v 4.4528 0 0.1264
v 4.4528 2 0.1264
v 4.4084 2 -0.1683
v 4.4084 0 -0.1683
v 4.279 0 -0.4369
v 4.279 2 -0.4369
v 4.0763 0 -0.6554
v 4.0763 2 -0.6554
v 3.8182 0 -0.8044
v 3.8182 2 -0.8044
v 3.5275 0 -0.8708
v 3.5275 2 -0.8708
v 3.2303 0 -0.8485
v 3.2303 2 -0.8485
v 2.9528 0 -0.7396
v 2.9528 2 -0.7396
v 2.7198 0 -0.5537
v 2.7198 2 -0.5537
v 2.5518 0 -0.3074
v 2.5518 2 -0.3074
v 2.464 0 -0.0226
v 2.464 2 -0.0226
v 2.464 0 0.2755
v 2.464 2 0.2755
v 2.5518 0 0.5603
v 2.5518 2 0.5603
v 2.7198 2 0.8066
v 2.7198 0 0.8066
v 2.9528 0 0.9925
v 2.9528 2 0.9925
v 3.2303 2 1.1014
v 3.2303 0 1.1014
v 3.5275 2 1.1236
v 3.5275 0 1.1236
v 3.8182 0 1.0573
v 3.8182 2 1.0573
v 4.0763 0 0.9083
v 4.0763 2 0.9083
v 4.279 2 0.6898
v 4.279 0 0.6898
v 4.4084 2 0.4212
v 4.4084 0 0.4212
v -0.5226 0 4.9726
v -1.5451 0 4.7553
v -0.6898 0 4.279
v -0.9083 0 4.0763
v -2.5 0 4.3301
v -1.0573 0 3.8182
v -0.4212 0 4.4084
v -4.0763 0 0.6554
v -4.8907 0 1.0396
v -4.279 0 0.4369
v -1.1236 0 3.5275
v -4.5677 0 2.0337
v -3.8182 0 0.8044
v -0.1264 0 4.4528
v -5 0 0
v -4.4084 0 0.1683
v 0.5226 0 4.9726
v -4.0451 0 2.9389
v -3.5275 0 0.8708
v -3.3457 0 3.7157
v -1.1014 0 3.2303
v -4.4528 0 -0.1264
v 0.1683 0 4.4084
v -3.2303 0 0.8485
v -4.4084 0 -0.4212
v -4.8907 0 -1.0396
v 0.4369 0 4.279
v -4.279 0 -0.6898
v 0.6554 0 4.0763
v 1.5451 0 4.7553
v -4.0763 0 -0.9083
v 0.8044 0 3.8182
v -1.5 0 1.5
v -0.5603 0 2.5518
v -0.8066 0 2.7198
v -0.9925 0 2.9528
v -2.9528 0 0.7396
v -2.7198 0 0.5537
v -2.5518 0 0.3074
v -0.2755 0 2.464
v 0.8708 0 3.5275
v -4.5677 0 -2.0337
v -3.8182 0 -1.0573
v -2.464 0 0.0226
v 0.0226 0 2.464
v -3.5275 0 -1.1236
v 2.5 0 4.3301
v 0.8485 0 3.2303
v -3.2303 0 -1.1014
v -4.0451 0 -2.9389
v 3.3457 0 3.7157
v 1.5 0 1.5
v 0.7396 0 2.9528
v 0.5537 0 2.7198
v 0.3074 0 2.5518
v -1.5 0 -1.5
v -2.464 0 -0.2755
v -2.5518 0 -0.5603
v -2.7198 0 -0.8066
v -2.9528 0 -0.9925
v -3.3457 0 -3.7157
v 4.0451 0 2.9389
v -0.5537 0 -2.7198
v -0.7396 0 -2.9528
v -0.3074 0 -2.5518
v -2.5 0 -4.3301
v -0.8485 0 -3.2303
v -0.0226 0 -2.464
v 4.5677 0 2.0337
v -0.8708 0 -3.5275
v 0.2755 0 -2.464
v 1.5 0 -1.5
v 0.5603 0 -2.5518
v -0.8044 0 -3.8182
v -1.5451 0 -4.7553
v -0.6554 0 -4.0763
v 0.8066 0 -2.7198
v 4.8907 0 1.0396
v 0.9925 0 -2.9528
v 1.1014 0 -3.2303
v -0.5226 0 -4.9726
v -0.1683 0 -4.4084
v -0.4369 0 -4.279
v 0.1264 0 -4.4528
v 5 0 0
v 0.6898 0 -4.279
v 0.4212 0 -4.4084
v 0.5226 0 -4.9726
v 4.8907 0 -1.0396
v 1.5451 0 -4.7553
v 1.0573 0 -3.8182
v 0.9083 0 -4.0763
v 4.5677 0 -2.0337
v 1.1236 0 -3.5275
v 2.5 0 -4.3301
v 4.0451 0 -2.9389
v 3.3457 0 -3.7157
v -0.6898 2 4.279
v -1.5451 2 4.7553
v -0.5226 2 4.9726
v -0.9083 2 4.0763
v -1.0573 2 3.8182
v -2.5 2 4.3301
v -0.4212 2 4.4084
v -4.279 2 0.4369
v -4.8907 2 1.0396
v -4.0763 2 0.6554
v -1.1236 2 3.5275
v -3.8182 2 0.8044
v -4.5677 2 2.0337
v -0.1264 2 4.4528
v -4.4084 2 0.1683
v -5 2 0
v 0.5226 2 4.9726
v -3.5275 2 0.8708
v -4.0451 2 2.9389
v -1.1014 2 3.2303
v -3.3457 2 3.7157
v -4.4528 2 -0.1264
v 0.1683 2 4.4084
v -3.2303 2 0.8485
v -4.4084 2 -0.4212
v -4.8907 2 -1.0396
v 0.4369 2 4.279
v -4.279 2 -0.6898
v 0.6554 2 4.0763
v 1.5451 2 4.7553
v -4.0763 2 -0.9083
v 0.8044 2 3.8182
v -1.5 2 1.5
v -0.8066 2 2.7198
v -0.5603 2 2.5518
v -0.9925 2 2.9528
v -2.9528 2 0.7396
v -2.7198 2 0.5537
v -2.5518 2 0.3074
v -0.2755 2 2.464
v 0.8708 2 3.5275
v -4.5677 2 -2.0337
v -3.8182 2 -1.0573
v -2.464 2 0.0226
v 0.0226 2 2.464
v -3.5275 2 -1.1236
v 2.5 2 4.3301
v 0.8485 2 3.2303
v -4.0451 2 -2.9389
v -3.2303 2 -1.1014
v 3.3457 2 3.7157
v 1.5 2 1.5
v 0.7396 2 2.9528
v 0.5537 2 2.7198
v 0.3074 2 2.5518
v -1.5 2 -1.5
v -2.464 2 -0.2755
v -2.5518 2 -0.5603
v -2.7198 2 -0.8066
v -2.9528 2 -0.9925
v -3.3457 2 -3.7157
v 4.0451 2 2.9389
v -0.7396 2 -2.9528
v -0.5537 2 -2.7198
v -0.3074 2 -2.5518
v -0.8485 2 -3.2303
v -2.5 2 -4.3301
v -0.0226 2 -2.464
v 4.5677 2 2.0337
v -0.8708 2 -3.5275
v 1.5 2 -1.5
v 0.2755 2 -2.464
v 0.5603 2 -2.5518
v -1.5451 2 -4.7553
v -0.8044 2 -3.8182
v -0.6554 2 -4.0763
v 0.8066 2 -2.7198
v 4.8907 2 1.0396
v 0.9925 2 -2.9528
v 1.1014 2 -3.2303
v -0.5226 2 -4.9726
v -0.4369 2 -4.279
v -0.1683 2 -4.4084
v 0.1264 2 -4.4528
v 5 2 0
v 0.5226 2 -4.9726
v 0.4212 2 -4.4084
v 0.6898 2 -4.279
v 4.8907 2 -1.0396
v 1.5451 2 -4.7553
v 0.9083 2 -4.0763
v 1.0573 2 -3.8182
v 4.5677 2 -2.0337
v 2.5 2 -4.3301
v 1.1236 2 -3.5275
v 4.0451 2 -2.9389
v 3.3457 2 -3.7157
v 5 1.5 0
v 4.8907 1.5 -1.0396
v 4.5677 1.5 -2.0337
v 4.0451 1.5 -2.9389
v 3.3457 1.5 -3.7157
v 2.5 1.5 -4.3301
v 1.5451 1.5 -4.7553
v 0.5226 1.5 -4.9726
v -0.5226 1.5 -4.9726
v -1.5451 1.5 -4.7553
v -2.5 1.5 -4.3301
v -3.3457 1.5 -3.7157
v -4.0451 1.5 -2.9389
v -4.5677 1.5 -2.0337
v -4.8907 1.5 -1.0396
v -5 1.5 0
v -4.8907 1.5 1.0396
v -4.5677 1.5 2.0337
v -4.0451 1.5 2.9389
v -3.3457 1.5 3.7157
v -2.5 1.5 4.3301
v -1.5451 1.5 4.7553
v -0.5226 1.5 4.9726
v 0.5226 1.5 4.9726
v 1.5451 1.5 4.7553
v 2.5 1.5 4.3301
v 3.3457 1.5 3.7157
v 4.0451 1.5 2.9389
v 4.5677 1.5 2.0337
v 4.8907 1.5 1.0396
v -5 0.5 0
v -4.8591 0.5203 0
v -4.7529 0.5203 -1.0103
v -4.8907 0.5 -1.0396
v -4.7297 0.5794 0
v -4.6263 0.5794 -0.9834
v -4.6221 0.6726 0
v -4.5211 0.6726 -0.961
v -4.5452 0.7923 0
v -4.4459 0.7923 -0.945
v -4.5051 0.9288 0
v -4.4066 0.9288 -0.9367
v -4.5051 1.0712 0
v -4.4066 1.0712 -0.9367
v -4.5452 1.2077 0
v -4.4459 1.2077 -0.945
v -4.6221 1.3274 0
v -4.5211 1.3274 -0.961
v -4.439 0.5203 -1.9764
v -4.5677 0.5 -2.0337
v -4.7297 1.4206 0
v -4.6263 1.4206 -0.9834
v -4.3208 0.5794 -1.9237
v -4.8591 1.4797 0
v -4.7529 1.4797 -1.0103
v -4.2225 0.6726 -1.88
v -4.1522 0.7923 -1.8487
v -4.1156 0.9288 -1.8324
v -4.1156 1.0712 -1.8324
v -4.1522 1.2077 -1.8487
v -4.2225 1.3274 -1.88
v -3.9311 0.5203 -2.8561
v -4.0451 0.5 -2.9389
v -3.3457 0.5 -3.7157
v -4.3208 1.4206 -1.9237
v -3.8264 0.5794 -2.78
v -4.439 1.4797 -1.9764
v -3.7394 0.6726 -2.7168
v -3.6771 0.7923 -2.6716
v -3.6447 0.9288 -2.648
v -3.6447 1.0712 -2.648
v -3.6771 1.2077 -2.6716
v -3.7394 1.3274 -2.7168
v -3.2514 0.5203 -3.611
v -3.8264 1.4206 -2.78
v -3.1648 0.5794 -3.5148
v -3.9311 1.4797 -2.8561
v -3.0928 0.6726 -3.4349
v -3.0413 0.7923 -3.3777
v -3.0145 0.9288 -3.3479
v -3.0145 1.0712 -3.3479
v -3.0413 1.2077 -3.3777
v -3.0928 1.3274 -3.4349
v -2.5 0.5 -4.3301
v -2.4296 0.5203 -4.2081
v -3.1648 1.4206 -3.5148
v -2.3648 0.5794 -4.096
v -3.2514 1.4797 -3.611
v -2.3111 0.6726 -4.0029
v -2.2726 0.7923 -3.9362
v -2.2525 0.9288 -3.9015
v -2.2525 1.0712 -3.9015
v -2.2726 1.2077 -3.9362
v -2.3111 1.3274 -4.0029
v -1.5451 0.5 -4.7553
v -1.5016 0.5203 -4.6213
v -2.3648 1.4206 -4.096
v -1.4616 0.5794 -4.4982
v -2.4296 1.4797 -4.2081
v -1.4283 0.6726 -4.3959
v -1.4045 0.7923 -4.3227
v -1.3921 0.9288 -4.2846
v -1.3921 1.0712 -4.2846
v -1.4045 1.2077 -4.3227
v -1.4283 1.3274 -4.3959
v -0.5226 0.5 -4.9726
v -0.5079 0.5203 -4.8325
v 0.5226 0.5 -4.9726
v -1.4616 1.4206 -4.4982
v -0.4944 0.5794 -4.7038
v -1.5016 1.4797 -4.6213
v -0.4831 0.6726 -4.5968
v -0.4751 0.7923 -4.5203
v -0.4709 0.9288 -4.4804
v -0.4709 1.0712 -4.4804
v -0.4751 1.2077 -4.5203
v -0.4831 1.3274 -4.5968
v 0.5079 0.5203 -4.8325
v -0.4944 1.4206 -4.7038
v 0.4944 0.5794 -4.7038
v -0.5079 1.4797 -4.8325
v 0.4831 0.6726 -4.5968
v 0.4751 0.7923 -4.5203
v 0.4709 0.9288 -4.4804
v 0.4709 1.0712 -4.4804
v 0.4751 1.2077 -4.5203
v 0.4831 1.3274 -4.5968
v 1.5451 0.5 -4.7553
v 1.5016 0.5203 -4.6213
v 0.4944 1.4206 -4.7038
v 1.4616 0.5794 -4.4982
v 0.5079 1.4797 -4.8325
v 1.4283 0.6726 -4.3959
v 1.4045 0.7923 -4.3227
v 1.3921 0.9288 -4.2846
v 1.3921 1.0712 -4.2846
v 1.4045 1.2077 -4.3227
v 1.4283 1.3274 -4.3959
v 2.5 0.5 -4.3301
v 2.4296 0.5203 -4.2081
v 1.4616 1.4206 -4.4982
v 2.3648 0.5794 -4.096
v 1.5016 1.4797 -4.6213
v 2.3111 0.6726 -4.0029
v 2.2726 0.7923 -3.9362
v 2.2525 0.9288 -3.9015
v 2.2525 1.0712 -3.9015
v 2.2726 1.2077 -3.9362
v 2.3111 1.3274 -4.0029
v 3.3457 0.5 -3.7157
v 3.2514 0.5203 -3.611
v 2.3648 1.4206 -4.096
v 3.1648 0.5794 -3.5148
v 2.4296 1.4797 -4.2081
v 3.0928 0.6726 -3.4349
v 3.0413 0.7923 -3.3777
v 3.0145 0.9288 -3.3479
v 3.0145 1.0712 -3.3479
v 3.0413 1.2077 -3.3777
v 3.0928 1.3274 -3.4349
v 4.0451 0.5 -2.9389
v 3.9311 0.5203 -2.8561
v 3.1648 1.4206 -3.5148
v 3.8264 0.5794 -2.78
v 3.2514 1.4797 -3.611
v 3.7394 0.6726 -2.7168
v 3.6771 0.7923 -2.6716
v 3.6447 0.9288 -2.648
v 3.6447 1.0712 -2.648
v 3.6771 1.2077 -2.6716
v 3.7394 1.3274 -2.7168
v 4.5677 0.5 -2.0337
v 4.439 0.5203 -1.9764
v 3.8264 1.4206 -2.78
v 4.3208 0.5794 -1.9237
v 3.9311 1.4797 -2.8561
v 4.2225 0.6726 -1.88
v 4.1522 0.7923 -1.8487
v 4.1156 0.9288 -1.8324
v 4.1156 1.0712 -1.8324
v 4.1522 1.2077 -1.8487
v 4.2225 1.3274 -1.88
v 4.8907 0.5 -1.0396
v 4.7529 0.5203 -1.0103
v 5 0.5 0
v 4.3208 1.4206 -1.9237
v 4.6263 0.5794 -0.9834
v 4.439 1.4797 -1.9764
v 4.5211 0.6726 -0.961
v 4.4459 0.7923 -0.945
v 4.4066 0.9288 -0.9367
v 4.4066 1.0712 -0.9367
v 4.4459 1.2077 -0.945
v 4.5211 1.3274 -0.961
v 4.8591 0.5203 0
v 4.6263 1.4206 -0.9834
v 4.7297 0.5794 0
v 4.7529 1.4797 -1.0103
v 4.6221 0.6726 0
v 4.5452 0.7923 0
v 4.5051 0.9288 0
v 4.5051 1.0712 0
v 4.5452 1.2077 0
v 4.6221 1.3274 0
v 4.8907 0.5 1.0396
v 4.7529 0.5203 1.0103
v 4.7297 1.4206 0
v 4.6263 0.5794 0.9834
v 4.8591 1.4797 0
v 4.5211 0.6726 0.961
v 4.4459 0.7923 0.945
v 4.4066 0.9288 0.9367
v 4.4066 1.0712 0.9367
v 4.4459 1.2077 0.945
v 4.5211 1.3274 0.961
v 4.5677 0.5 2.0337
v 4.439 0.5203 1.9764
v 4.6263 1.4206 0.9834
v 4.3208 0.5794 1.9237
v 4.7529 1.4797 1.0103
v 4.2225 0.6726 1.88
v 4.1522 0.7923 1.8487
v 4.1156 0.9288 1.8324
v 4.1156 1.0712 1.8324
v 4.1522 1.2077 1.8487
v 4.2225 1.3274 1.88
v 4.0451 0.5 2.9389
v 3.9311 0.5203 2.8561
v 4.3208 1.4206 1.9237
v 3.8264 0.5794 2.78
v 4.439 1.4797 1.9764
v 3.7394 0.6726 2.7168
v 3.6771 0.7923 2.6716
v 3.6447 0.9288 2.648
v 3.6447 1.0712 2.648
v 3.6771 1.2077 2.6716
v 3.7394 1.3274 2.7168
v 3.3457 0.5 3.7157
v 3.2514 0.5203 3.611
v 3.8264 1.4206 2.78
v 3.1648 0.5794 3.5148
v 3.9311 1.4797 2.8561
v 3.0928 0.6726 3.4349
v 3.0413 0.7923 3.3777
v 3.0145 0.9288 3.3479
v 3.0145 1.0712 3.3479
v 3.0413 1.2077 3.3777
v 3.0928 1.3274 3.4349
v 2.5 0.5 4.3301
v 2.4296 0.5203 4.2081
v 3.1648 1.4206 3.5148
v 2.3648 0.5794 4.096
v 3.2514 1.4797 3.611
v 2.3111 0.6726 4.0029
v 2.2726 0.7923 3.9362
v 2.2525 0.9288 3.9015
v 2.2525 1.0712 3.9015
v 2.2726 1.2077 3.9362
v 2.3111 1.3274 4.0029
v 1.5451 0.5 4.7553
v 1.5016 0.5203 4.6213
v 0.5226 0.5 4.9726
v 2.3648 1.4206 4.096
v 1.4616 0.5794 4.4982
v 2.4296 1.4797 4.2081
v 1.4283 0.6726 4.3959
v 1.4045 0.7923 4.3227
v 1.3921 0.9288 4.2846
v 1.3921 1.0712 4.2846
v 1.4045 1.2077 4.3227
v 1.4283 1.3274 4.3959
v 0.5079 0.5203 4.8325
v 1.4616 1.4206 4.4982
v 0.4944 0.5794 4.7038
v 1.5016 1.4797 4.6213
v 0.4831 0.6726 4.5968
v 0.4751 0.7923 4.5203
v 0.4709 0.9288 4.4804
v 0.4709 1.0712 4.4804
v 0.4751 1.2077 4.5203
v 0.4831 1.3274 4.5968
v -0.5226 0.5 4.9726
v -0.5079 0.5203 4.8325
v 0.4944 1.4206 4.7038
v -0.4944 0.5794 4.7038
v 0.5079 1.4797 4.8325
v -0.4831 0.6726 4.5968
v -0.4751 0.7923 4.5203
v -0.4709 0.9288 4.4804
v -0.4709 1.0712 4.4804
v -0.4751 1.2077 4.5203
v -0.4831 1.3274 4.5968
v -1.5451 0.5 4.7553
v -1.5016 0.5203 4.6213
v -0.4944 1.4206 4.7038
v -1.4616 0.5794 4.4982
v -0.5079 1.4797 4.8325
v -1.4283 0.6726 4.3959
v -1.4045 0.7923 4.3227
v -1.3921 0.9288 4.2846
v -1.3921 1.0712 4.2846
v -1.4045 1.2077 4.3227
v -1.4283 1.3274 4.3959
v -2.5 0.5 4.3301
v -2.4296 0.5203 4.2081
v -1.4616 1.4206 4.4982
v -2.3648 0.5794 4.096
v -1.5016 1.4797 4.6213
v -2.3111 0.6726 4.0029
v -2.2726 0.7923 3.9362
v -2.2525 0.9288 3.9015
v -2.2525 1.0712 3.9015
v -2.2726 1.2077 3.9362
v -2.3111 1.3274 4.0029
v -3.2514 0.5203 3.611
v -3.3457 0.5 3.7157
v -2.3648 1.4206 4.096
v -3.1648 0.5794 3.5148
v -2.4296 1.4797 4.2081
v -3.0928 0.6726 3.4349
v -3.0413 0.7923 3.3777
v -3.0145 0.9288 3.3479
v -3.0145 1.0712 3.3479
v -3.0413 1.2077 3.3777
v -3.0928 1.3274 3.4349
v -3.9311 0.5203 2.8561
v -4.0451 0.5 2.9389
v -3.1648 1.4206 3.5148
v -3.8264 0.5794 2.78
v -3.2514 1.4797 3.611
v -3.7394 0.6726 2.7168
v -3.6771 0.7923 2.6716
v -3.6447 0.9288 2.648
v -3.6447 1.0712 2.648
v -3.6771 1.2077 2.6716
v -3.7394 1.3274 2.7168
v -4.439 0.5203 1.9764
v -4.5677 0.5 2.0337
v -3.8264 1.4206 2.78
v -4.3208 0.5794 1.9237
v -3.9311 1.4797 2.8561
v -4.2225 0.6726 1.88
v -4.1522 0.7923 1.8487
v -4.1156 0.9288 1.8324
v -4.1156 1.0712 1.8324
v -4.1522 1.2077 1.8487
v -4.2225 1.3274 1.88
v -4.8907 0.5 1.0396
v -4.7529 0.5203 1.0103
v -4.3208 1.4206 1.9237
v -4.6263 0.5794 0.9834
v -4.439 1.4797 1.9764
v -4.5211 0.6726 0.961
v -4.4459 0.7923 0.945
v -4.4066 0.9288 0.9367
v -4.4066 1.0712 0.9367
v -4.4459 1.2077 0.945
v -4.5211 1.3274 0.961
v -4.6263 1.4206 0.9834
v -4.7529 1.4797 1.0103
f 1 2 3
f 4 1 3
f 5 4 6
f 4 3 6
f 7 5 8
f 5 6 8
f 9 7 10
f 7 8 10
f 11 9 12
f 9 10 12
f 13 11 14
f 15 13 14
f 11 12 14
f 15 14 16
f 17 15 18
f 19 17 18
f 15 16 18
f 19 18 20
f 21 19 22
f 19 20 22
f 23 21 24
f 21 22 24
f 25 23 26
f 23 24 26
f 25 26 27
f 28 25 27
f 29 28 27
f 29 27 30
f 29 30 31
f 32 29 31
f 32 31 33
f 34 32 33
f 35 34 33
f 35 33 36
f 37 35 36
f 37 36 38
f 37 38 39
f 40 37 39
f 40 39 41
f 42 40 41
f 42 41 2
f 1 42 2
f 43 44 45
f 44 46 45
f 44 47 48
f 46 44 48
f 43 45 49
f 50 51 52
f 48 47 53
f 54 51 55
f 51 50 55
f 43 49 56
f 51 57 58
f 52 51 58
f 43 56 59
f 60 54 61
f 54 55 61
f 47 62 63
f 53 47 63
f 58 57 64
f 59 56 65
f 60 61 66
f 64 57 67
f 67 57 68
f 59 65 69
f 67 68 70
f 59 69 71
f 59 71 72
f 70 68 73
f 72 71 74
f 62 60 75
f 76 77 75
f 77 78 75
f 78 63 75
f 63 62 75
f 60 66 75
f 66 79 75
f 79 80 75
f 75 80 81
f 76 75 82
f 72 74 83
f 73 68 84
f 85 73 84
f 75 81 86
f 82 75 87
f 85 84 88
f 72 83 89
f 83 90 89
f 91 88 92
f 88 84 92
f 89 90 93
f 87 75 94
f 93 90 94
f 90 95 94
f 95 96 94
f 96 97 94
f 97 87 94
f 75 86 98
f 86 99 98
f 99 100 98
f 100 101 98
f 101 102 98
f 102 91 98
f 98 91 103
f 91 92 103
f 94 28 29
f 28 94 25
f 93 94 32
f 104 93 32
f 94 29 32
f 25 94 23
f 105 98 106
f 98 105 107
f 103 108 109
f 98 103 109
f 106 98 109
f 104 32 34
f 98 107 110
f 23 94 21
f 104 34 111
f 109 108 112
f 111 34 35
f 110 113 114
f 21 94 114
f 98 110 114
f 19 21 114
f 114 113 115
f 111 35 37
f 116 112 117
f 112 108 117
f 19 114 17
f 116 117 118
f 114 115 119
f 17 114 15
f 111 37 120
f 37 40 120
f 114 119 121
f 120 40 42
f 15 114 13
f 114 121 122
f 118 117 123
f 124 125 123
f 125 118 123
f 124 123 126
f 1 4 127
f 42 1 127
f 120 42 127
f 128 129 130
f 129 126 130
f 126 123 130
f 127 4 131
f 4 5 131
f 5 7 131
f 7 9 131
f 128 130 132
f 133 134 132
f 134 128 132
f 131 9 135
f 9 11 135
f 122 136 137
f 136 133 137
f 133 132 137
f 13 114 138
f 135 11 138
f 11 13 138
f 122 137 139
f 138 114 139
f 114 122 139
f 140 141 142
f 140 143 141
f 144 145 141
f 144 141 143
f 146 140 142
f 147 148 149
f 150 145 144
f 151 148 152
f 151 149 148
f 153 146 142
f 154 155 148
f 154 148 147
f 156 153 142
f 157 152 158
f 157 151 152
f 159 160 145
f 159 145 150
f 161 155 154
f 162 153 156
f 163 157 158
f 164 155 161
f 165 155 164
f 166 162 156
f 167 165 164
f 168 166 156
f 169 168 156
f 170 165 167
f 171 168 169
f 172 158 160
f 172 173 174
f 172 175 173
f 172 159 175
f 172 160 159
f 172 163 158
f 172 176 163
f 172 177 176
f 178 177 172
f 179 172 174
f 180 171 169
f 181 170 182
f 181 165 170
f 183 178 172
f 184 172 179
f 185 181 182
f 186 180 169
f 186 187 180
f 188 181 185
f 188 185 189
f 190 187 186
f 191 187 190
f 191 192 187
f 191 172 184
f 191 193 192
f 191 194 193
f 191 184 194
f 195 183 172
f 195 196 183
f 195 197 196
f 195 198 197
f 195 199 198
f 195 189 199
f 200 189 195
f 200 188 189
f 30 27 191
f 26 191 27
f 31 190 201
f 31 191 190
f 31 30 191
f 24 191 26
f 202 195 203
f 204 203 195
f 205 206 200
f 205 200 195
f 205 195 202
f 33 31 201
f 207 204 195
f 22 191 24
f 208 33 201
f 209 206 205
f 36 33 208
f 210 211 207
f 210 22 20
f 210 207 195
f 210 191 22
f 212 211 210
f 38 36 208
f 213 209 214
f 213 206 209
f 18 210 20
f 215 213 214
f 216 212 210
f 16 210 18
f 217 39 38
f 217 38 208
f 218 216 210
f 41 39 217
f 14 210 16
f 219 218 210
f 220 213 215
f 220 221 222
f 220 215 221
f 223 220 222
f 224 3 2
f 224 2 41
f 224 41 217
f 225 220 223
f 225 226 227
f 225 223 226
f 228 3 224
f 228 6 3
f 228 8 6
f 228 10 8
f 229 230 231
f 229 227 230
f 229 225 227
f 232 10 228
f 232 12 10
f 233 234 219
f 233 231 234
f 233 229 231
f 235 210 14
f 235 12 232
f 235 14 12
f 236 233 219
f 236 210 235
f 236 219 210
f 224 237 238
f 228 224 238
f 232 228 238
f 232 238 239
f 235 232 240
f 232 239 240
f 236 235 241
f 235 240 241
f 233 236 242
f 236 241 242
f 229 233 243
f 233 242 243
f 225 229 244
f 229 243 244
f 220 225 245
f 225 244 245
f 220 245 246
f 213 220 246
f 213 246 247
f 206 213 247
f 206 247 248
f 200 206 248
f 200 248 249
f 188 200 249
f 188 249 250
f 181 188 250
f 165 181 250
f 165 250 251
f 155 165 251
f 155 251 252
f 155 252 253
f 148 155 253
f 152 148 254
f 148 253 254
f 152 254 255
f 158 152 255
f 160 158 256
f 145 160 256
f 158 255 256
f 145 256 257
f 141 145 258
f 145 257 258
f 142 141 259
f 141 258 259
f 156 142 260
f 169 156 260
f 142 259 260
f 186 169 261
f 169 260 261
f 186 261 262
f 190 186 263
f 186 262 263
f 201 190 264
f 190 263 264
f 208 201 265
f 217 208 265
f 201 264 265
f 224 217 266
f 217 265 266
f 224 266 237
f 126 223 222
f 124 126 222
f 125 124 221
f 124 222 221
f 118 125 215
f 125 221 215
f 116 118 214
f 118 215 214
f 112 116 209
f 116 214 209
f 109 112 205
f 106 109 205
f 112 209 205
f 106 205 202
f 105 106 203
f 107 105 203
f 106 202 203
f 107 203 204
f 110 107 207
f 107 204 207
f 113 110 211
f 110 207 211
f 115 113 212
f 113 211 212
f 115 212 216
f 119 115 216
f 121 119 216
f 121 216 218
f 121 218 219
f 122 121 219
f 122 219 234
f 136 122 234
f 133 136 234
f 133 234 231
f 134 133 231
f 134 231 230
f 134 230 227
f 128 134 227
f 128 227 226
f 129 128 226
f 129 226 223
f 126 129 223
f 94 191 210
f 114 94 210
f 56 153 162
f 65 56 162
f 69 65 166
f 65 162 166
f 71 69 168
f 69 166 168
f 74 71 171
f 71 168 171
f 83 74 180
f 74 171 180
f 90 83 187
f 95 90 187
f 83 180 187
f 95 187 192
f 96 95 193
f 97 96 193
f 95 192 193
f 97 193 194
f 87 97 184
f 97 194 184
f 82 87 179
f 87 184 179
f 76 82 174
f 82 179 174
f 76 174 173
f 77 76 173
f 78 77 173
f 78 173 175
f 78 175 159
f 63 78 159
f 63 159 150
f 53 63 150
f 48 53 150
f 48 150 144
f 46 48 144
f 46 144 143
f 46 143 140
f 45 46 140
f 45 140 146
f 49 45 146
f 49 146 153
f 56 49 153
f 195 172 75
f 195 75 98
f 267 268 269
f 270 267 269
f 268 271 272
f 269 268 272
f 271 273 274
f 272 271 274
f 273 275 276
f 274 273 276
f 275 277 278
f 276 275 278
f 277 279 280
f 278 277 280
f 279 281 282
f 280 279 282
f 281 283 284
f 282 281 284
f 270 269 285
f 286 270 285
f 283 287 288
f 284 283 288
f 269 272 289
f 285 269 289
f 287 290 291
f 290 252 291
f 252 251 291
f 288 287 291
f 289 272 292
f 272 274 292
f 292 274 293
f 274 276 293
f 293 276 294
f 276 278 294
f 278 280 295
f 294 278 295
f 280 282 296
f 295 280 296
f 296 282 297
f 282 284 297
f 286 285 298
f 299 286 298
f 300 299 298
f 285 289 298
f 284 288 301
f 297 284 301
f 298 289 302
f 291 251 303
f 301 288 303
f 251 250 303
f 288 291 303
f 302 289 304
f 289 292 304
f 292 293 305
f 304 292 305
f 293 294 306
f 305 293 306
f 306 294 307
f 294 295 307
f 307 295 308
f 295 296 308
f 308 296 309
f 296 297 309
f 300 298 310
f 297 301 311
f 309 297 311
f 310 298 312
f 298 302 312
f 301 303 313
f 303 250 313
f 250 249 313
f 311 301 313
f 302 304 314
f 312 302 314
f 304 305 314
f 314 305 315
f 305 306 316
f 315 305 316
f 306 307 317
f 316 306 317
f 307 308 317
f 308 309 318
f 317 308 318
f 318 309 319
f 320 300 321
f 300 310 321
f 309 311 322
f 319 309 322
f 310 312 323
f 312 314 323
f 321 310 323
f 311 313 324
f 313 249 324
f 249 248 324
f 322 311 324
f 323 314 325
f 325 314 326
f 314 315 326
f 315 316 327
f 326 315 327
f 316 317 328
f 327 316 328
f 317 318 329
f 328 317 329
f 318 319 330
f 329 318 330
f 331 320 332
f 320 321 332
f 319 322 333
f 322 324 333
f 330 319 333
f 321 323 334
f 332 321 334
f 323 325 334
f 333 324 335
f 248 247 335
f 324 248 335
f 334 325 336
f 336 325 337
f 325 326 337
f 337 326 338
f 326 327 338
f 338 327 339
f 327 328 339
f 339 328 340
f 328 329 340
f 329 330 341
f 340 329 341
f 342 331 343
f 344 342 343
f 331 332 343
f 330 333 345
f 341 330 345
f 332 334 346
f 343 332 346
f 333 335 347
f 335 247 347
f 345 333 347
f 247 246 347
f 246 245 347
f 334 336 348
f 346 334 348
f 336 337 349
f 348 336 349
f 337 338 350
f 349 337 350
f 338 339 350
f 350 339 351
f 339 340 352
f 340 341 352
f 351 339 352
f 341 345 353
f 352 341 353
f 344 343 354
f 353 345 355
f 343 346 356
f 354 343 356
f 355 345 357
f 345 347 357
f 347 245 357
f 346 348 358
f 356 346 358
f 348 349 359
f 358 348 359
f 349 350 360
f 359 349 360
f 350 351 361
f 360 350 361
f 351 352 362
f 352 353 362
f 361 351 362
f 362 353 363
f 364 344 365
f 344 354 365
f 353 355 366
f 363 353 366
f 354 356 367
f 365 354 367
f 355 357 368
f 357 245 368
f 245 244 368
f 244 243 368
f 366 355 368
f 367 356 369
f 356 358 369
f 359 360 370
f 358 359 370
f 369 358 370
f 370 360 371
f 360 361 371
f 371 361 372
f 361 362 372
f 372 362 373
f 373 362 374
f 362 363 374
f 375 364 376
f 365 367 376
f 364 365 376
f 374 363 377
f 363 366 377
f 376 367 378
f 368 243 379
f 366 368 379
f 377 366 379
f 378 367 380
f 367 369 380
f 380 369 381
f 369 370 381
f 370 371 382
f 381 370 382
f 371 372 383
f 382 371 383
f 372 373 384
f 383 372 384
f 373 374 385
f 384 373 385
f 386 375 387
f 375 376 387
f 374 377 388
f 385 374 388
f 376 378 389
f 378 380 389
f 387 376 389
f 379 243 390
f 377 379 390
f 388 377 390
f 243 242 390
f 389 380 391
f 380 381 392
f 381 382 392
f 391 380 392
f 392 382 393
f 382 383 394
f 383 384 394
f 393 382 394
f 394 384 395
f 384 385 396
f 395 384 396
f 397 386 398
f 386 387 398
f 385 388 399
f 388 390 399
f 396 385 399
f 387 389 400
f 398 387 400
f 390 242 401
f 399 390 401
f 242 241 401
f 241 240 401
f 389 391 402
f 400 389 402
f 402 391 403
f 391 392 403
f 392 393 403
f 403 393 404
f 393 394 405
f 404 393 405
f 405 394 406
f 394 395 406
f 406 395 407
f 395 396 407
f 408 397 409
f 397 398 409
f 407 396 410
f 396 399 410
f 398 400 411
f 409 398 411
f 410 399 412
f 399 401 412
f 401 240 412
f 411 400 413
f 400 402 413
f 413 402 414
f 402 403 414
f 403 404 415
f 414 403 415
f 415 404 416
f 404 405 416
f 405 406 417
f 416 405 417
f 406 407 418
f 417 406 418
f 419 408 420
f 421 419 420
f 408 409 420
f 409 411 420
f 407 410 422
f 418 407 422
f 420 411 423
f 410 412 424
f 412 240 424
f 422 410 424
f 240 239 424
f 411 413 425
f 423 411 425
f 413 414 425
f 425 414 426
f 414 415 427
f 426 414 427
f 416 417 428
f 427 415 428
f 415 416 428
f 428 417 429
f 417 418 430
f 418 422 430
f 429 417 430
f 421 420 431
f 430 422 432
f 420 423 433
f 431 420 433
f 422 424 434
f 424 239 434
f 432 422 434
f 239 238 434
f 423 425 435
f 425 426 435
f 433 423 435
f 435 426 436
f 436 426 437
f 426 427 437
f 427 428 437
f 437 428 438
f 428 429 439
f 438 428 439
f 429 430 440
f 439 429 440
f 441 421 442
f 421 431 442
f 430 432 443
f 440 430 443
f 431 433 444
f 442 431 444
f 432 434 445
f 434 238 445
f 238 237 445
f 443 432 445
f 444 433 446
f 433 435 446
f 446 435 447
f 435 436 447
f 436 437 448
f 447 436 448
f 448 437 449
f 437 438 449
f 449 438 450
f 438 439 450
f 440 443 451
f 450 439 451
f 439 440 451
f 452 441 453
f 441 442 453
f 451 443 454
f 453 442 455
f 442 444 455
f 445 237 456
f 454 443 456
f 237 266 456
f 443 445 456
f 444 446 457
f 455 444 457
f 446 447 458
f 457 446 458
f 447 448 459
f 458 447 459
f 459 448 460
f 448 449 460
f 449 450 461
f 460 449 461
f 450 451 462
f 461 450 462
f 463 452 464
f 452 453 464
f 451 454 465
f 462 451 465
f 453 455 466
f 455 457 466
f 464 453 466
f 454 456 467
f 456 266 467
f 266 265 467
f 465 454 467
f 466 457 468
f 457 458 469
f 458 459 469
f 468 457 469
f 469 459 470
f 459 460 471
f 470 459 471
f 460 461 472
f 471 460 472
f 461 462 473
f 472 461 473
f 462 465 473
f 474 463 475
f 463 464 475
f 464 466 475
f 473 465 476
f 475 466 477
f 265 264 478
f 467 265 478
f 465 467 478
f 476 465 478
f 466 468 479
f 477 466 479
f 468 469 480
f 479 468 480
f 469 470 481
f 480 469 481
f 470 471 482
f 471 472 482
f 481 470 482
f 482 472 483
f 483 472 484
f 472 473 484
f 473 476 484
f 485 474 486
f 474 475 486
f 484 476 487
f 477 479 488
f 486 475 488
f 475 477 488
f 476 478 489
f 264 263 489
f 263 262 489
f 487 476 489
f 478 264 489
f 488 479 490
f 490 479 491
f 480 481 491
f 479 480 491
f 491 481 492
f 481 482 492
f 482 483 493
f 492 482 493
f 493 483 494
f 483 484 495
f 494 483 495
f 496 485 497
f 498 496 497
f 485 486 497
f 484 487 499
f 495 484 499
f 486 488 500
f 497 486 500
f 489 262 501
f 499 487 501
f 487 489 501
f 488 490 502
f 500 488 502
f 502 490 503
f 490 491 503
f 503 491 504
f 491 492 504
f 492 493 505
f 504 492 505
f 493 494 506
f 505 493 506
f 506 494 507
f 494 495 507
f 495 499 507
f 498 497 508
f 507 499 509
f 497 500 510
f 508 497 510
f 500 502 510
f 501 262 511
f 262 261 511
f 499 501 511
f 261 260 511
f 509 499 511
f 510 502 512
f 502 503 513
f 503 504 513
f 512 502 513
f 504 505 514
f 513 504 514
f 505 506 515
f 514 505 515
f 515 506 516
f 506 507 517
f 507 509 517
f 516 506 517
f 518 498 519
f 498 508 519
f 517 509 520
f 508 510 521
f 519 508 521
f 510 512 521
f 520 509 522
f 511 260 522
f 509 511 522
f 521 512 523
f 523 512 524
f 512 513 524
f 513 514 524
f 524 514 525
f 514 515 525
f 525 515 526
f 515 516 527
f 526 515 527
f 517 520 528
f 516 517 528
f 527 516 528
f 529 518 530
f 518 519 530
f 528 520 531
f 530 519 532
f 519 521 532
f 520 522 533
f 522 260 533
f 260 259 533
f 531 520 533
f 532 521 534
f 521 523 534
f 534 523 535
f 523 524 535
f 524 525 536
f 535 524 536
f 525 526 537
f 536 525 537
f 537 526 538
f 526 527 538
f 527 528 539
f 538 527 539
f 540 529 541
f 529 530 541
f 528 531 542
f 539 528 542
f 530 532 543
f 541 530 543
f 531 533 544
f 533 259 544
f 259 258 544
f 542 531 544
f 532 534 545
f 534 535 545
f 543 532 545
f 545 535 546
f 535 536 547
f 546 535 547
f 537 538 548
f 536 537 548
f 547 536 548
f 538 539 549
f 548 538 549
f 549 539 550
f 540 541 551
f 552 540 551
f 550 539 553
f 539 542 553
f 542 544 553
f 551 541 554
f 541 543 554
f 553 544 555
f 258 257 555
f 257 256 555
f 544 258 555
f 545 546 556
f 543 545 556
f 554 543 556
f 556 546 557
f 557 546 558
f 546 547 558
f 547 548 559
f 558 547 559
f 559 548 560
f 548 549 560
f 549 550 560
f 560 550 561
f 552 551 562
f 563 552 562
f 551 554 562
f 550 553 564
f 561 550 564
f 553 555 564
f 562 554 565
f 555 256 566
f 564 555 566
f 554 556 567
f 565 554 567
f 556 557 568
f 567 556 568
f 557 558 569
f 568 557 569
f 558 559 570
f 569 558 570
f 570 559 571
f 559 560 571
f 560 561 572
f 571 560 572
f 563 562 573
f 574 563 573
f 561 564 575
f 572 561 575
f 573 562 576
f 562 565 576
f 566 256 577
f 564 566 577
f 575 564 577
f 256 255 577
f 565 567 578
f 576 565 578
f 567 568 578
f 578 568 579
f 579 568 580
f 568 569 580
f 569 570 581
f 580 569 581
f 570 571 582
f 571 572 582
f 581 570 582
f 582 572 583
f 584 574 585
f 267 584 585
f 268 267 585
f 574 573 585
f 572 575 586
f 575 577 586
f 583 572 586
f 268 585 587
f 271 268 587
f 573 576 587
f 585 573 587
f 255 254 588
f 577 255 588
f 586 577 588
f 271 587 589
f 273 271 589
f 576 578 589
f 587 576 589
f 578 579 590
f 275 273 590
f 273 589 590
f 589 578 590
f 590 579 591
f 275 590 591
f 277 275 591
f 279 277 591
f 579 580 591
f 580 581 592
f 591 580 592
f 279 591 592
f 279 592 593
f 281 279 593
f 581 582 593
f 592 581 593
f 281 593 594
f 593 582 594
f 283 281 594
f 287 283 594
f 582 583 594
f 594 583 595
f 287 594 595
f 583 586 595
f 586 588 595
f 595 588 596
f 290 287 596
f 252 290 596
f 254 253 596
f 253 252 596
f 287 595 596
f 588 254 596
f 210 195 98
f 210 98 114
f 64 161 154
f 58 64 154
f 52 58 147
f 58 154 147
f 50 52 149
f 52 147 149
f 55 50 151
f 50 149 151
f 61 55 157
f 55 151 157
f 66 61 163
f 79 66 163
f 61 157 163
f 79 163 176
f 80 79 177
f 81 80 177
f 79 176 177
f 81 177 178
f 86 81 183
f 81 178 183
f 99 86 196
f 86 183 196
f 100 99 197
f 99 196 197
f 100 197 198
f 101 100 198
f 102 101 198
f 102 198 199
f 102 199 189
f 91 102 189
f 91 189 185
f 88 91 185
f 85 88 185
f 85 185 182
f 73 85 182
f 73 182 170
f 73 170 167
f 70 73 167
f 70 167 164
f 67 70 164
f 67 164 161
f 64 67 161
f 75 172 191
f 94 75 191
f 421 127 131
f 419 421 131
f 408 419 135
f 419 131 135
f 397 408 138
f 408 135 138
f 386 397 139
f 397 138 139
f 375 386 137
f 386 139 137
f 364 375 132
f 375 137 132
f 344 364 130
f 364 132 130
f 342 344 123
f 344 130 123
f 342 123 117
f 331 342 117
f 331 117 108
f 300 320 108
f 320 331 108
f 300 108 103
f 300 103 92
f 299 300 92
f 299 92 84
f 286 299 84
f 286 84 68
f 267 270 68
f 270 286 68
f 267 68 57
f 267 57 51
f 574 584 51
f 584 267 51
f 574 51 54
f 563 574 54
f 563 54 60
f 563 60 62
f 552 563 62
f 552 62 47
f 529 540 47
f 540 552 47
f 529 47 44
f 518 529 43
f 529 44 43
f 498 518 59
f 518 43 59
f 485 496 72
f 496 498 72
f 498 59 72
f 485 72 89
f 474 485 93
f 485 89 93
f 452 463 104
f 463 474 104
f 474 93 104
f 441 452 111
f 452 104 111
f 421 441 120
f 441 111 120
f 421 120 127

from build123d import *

# Parameters (mm, degrees)
SKIZZE1_R                       = 5
AUFSATZ_LINEAR_AUSTRAGEN1_DEPTH = 2
SKIZZE3_W                       = 3
SKIZZE3_H                       = 3
SCHNITT_LINEAR_AUSTRAGEN1_DEPTH = 3
SKIZZE4_R                       = 1
SCHNITT_LINEAR_AUSTRAGEN2_DEPTH = 3
KREISMUSTER1_COUNT              = 4


with BuildPart() as part:
    # Skizze1 → Aufsatz-Linear austragen1 (new body)
    with BuildSketch(Plane(origin=(0, 0, 0), x_dir=(1, 0, 0), z_dir=(0, 1, 0))):
        Circle(SKIZZE1_R)
    extrude(amount=AUFSATZ_LINEAR_AUSTRAGEN1_DEPTH)

    # Skizze3 → Schnitt-Linear austragen1 (cut)
    with BuildSketch(Plane(origin=(0, 2, 0), x_dir=(1, 0, 0), z_dir=(0, 1, 0))):
        Rectangle(SKIZZE3_W, SKIZZE3_H)
    extrude(amount=-SCHNITT_LINEAR_AUSTRAGEN1_DEPTH, mode=Mode.SUBTRACT)

    # Skizze4 → Schnitt-Linear austragen2 (cut)
    with BuildSketch(Plane(origin=(0, 2, 0), x_dir=(1, 0, 0), z_dir=(0, 1, 0))):
        with Locations((3.452809927, -0.126446108)):
            Circle(SKIZZE4_R)
    schnitt_linear_austragen2 = extrude(amount=-SCHNITT_LINEAR_AUSTRAGEN2_DEPTH, mode=Mode.SUBTRACT)

    # Kreismuster1: Schnitt-Linear austragen2 ×4 about axis
    kreismuster1_axis = Axis((0, 0, 0), (0, 1, 0))
    for i in range(1, KREISMUSTER1_COUNT):
        add(schnitt_linear_austragen2.rotate(kreismuster1_axis, i * 360 / KREISMUSTER1_COUNT), mode=Mode.SUBTRACT)

    # Skizze6 → Schnitt-Rotation2 (revolve, cut)
    with BuildSketch(Plane.XY):
        with BuildLine():
            Line((-5, 1.5), (-5, 0.5))
            ThreePointArc((-5, 0.5), (-4.5, 1), (-5, 1.5))
        make_face()
    revolve(axis=Axis((0, 2, 0), (0, -1, 0)), mode=Mode.SUBTRACT)


solid = part.part
